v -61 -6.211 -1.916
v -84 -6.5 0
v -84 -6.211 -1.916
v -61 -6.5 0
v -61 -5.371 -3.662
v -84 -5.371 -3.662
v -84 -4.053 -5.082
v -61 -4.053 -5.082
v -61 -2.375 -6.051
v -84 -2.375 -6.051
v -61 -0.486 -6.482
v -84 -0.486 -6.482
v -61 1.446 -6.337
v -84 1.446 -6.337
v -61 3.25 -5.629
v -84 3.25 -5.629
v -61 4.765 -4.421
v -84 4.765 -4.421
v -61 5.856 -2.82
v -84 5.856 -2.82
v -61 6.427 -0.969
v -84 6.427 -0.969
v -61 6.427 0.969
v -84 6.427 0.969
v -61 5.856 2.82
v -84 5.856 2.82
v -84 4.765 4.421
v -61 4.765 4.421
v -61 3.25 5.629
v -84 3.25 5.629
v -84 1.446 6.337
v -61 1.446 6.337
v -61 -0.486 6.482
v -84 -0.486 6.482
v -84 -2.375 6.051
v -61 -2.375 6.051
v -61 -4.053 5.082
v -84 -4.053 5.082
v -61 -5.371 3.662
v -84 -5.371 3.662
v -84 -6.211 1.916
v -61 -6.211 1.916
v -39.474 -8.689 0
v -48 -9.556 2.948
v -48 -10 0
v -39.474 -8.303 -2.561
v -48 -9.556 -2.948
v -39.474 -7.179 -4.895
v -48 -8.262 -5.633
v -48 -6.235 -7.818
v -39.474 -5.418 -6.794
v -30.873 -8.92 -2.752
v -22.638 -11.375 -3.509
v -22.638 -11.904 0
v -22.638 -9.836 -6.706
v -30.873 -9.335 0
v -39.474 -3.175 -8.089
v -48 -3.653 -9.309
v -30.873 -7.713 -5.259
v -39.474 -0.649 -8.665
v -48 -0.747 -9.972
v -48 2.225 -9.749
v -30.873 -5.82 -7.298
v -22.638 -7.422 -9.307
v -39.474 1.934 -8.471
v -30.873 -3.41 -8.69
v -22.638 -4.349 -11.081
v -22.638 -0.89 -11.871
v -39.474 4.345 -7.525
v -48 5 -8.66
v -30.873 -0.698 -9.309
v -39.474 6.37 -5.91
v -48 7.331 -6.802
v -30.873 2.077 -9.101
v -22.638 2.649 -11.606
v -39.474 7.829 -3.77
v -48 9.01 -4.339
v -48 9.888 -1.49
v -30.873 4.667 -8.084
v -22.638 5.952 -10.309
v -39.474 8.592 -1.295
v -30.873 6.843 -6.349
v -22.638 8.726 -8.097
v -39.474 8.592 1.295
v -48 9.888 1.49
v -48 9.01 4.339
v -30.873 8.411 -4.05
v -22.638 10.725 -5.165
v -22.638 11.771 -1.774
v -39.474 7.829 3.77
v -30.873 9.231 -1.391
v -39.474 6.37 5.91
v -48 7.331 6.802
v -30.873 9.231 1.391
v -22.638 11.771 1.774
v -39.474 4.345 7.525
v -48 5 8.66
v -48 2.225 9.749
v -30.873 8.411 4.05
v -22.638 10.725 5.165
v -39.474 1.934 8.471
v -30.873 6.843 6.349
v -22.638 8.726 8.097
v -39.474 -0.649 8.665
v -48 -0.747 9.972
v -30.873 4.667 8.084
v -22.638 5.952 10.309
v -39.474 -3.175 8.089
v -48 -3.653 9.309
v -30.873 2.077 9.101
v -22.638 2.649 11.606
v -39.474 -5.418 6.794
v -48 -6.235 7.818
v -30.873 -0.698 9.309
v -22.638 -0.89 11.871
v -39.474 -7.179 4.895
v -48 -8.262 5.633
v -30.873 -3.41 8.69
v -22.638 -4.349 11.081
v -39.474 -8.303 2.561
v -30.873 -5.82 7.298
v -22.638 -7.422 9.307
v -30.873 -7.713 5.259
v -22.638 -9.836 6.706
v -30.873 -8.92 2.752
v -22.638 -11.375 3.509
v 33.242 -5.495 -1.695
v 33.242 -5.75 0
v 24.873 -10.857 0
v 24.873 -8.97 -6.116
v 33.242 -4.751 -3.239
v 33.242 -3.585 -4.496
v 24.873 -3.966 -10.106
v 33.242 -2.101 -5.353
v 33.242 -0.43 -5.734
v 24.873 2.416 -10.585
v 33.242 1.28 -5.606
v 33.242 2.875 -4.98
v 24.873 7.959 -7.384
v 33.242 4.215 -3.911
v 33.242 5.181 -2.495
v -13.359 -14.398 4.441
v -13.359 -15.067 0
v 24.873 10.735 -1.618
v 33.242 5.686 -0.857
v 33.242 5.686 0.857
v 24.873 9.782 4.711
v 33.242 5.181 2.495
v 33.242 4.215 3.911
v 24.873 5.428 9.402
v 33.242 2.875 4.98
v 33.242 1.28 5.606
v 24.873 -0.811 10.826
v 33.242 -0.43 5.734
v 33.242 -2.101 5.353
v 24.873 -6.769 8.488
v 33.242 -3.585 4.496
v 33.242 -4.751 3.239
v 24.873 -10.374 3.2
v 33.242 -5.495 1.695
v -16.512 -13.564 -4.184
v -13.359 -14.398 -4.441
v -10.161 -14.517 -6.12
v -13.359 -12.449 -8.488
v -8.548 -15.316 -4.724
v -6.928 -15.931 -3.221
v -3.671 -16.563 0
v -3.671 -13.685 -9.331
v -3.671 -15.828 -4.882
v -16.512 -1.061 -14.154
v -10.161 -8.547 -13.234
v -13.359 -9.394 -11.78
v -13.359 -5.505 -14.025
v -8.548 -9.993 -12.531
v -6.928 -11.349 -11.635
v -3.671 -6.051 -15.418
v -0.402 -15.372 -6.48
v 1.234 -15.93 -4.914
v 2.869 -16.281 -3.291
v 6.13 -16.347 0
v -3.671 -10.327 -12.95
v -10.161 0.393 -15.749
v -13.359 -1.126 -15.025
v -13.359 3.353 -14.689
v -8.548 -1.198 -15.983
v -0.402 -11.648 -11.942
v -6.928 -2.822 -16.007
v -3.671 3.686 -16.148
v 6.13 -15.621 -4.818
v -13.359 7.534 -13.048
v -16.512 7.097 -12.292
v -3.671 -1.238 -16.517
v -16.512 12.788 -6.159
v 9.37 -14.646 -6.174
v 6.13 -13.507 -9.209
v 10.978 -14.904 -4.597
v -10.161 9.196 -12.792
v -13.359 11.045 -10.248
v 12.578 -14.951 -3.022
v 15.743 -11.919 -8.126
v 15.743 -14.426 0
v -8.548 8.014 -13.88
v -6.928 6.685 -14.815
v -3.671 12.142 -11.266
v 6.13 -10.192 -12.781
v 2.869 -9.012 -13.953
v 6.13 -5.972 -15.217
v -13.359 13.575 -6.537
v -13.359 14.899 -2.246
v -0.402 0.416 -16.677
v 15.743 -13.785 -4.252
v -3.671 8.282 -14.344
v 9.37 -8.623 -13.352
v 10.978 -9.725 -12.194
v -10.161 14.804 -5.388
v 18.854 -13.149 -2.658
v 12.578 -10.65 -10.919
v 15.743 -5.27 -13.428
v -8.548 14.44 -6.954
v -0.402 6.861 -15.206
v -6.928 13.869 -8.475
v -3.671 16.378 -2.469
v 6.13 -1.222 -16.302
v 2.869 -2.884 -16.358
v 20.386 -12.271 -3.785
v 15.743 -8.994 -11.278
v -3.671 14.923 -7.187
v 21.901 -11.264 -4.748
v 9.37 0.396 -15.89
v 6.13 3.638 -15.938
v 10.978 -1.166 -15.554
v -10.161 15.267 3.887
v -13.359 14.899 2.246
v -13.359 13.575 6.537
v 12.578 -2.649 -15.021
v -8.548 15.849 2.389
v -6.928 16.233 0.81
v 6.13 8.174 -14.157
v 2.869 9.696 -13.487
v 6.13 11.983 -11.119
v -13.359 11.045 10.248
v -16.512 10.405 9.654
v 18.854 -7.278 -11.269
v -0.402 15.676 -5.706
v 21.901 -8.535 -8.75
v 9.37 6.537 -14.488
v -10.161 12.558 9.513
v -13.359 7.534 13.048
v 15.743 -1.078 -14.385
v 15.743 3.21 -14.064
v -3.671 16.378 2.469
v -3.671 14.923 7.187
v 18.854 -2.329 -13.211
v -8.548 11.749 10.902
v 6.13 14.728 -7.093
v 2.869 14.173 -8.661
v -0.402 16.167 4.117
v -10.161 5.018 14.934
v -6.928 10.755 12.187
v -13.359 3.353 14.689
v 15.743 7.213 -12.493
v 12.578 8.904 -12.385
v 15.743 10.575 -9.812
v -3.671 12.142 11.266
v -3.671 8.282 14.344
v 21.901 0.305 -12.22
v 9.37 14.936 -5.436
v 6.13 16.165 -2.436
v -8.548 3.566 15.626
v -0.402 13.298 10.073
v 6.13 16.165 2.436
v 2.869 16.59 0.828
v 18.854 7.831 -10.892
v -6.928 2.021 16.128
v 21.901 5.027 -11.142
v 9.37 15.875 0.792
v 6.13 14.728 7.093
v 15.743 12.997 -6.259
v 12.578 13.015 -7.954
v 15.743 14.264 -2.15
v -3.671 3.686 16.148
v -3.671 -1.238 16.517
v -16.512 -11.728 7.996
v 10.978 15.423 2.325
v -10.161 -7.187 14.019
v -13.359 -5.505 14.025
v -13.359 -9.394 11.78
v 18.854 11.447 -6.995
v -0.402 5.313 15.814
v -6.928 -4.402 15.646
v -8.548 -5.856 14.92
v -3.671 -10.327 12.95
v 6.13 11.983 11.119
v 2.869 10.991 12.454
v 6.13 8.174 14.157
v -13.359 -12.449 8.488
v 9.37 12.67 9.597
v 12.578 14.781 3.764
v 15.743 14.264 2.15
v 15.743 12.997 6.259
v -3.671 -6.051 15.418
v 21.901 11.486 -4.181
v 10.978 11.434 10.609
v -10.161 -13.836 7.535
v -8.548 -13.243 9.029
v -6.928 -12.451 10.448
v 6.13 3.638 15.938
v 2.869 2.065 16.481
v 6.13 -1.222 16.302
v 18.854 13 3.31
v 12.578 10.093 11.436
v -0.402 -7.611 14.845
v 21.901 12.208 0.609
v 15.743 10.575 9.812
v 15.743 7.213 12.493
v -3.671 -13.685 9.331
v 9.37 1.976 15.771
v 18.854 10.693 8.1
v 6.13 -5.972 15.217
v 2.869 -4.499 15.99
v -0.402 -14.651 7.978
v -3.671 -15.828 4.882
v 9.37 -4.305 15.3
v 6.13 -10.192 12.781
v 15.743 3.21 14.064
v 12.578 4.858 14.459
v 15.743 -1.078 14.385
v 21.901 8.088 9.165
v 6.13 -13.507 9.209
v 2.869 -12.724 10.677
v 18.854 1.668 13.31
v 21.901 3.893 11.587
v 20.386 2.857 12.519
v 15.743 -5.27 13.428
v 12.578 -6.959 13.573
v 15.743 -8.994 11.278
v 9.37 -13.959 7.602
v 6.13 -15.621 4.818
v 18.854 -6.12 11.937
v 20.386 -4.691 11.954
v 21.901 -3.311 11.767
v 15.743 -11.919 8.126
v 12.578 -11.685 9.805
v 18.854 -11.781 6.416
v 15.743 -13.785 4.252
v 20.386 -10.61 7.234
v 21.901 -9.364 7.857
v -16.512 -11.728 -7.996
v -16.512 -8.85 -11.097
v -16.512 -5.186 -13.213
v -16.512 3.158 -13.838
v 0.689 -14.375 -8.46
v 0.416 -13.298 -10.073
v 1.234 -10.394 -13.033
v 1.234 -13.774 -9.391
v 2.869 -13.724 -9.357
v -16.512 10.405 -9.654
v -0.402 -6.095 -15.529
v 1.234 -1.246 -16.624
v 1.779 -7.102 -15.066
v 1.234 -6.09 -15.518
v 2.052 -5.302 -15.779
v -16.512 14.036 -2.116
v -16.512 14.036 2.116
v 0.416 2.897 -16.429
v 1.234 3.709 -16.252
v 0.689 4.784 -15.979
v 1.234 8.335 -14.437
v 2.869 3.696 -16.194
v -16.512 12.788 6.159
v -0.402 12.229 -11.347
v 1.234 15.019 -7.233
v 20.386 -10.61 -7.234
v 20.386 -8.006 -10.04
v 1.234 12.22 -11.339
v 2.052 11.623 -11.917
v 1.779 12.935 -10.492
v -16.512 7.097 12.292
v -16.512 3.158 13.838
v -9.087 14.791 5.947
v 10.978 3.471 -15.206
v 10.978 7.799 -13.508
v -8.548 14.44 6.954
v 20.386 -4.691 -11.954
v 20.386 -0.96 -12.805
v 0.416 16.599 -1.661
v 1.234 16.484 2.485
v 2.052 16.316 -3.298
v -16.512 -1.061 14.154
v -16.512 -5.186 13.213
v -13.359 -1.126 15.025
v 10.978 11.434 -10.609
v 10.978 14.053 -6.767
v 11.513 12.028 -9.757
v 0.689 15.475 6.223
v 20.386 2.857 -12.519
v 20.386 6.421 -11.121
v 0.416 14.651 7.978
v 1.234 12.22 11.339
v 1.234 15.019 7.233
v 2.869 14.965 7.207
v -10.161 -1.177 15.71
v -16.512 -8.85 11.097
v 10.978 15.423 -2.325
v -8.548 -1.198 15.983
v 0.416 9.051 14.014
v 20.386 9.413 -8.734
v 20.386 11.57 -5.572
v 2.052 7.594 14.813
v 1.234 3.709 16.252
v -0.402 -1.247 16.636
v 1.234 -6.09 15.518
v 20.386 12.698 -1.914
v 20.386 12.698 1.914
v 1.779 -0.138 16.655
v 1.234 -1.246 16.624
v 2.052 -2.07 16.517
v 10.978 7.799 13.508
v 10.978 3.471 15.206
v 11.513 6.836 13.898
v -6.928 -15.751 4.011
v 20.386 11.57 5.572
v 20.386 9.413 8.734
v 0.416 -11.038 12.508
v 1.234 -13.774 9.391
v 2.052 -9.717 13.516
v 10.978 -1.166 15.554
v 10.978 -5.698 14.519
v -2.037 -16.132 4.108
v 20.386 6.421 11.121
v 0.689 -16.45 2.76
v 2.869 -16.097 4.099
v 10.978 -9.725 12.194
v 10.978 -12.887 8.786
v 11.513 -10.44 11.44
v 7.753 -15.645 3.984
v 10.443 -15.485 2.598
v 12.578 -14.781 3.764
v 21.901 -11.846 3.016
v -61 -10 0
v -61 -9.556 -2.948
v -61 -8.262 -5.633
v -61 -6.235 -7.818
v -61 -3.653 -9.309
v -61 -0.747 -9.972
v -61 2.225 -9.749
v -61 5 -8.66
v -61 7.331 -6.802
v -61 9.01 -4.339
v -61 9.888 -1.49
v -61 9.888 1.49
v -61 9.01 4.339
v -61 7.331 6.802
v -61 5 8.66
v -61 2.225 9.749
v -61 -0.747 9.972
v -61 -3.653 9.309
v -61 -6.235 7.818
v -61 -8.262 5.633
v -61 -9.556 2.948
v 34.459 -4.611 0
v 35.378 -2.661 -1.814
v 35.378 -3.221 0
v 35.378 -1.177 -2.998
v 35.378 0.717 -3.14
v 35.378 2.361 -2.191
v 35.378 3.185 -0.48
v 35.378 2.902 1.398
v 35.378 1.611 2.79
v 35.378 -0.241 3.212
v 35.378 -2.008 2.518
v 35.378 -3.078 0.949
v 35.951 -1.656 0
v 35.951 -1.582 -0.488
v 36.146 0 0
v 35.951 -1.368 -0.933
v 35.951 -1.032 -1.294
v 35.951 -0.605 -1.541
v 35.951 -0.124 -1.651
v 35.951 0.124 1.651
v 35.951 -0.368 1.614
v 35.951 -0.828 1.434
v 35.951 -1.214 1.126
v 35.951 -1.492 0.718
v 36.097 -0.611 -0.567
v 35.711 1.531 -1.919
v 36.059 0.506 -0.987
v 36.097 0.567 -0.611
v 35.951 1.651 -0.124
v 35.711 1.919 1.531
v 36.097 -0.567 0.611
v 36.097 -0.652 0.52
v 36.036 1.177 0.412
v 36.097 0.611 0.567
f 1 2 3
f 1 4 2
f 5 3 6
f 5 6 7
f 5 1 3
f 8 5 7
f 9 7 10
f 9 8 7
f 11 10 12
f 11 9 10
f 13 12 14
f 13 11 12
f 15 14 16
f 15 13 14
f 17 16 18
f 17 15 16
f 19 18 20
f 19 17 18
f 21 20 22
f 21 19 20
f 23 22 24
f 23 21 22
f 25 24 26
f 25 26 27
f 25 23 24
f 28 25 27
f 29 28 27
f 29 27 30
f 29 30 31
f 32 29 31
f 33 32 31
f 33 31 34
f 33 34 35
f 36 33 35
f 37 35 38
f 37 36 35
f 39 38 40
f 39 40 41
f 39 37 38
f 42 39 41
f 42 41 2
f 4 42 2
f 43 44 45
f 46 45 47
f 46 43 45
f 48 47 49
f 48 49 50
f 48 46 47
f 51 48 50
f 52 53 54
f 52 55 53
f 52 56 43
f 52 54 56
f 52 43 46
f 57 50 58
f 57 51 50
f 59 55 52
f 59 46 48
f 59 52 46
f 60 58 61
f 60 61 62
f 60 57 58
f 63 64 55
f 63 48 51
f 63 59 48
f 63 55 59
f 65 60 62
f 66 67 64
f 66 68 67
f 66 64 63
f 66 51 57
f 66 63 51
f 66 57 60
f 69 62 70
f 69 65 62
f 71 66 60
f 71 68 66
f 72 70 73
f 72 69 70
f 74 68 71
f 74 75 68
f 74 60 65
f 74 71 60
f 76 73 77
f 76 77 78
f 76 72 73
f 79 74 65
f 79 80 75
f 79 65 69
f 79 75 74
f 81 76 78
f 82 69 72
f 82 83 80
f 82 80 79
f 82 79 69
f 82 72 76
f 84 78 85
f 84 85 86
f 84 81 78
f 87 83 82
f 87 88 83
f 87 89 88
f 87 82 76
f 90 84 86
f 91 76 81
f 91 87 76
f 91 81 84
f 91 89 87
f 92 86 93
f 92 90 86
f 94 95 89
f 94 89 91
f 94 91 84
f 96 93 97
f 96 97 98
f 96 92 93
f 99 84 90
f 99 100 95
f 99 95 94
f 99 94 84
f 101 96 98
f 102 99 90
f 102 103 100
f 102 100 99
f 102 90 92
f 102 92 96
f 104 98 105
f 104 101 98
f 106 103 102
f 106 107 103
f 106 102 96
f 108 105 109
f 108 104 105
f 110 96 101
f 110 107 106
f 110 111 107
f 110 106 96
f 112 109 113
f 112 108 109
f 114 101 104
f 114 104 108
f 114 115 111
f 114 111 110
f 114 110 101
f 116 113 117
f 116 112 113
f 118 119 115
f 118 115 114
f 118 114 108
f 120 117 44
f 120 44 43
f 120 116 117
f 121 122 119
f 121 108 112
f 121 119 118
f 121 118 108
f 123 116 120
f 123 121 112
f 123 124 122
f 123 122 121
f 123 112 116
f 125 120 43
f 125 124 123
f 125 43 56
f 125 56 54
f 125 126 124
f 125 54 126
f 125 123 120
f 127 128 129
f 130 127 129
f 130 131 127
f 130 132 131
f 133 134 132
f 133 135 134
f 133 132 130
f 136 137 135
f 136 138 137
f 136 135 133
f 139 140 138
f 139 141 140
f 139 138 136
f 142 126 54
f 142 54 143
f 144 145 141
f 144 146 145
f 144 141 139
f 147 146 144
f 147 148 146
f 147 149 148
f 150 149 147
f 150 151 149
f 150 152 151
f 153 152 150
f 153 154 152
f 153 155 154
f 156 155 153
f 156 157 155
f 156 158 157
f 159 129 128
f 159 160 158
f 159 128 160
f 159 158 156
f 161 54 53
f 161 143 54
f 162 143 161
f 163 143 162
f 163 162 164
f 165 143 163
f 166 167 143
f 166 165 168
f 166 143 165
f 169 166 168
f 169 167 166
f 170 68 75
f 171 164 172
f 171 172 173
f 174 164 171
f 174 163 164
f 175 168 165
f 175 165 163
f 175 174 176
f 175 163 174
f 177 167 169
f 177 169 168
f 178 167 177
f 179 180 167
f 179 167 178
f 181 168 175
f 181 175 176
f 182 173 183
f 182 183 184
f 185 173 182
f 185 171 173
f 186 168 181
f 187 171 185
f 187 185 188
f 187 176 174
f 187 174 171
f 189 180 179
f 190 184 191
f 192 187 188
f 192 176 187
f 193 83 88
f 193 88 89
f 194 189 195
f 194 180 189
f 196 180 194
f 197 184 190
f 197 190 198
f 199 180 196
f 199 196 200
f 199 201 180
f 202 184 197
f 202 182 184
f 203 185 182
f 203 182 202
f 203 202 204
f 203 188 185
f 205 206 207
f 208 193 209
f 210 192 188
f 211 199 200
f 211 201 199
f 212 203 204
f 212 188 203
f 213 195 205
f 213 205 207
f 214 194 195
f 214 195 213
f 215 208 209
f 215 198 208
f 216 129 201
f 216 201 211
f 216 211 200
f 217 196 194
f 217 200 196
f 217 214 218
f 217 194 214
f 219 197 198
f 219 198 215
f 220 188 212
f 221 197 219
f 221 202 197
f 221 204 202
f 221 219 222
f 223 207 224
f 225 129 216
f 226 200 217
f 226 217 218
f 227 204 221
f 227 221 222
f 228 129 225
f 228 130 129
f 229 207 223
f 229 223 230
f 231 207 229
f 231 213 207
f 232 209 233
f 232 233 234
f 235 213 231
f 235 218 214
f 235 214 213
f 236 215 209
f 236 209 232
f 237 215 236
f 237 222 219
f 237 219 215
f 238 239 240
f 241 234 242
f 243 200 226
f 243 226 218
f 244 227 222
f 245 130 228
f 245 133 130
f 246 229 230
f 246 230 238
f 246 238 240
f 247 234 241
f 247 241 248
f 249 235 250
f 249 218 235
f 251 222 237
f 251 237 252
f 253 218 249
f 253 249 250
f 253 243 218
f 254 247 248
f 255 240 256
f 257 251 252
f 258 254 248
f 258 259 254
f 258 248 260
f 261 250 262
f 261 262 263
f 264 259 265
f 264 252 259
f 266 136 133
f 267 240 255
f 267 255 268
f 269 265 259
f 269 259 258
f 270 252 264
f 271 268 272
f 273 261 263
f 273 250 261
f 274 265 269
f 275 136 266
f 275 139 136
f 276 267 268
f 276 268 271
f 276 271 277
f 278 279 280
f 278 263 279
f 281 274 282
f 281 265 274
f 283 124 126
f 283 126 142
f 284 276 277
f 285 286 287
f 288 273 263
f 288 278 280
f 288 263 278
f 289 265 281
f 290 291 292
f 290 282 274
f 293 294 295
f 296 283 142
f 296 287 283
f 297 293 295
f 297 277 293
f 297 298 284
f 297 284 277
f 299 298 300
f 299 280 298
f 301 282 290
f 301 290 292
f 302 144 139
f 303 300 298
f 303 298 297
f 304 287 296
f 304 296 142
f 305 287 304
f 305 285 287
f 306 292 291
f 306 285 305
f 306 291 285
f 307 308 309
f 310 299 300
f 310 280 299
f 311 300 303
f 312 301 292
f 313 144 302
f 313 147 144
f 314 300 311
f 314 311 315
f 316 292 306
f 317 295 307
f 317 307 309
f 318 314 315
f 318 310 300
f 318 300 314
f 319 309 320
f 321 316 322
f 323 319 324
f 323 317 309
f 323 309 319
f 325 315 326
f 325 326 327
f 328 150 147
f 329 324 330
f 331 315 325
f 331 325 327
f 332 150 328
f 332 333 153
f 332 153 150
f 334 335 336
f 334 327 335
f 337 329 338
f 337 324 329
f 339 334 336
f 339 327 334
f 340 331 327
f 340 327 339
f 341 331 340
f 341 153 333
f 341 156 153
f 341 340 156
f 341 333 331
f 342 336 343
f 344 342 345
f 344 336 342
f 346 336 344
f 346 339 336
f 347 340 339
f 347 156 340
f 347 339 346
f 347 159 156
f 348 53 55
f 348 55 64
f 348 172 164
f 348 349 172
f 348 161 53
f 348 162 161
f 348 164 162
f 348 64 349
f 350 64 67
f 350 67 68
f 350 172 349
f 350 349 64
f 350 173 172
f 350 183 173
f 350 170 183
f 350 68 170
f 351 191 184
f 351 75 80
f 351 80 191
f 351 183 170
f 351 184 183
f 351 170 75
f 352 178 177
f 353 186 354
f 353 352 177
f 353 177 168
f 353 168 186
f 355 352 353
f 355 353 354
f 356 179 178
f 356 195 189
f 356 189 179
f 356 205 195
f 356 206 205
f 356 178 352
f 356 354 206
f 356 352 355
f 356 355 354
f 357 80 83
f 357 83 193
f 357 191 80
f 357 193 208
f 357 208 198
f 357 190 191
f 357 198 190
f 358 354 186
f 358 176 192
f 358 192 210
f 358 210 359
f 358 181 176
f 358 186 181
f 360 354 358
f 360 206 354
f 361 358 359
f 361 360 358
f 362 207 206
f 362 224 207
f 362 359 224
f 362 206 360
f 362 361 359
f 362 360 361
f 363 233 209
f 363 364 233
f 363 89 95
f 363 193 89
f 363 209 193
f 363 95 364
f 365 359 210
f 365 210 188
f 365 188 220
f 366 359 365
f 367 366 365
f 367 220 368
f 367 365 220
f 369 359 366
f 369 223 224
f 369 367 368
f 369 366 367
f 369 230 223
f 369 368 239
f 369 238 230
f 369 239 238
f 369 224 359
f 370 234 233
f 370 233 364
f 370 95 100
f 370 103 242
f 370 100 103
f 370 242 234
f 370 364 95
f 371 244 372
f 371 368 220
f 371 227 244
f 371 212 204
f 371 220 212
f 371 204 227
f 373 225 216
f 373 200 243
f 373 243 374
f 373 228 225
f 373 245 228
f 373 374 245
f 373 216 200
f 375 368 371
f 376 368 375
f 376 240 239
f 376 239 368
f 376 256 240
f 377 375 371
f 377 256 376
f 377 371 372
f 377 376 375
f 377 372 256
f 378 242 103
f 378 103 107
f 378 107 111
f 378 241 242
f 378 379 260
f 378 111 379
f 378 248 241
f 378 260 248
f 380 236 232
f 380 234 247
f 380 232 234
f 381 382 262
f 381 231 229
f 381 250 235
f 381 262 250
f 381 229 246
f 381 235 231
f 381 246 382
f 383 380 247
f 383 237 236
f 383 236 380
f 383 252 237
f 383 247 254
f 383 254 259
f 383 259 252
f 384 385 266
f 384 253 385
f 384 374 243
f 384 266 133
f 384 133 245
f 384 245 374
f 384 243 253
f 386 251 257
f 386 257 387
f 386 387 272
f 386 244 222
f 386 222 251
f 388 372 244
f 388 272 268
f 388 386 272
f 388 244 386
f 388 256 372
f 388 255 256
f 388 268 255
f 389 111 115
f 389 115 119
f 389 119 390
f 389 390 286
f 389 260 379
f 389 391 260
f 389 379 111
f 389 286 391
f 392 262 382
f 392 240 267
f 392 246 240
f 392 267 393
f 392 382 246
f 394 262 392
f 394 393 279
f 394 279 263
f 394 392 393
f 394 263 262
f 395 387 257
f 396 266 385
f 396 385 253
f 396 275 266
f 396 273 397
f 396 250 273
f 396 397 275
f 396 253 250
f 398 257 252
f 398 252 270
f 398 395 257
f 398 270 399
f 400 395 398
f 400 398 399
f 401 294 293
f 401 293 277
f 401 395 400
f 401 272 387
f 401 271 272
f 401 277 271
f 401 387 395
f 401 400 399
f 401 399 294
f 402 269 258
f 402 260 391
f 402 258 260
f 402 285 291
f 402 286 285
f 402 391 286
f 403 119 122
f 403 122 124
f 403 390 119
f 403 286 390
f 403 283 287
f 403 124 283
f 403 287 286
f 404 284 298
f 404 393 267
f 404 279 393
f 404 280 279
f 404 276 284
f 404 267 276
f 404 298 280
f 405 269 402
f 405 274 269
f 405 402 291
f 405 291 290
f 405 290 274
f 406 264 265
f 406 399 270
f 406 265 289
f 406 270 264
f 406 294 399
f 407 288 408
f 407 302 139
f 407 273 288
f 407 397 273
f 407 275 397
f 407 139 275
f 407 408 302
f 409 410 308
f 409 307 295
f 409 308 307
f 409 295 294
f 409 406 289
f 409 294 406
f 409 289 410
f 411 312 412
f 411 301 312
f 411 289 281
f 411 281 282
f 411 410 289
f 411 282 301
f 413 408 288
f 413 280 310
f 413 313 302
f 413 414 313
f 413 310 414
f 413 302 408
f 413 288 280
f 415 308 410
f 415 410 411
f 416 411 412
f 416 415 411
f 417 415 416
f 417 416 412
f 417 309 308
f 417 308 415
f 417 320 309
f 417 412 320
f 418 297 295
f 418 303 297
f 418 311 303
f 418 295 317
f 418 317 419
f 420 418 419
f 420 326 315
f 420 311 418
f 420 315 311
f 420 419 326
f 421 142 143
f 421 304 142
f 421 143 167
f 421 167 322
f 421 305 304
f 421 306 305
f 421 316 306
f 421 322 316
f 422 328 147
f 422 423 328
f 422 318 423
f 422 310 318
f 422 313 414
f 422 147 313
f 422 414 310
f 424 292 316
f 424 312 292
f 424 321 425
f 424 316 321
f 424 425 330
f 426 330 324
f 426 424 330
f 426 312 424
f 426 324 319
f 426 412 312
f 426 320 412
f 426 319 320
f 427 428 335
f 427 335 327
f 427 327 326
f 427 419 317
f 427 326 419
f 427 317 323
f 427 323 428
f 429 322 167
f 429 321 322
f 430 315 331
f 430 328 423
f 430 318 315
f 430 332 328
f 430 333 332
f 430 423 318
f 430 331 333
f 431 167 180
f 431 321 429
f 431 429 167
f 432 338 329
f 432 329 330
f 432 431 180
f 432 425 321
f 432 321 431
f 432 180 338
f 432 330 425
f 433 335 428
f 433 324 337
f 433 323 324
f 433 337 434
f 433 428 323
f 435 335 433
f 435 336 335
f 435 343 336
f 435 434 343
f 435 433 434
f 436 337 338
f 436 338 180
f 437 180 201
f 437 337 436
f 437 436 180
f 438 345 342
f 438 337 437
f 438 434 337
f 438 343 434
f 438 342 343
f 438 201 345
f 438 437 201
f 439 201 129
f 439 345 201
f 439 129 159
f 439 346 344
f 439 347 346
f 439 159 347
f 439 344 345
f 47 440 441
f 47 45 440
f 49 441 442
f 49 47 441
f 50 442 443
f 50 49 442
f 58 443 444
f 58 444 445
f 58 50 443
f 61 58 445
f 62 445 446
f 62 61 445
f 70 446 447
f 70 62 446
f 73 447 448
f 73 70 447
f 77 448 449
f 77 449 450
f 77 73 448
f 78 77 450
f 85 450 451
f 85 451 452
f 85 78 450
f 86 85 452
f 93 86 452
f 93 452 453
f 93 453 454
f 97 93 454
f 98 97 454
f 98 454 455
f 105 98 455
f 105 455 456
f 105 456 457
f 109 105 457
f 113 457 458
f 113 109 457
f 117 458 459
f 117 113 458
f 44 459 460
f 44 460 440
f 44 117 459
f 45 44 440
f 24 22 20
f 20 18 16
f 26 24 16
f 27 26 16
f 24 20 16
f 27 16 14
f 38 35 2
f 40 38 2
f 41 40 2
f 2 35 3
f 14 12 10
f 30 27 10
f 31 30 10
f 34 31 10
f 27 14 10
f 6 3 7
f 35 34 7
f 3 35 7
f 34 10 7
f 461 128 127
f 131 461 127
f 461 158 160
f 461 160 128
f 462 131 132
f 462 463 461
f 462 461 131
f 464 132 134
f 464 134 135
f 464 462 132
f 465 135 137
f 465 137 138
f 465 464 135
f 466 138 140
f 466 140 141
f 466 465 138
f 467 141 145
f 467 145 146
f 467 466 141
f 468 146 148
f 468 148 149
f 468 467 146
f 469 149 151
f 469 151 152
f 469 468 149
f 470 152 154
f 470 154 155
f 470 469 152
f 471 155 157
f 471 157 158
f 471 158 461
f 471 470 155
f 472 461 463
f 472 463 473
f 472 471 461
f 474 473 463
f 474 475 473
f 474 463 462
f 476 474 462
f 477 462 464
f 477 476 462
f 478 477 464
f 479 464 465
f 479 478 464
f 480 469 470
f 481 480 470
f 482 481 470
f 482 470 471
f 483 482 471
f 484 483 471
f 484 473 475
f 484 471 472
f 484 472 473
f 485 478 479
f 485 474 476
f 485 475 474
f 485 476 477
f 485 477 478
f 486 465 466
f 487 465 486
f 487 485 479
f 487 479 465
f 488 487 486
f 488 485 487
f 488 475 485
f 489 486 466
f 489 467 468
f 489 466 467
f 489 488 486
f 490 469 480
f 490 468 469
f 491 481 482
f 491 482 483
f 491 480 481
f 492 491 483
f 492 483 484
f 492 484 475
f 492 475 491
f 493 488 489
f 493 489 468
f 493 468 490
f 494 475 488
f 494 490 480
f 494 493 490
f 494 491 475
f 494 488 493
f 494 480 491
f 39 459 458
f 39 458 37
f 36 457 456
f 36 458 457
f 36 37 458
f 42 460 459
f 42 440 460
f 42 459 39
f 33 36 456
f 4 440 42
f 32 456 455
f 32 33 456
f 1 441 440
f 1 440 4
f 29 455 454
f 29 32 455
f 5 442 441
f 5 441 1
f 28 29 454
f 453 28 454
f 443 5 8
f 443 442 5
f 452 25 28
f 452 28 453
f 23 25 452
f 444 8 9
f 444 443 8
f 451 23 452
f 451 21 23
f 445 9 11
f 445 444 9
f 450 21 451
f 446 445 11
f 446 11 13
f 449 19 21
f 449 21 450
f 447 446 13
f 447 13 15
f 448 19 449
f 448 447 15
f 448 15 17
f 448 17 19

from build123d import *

# Parameters (mm, degrees)
F0_W = 23
F0_H = 6.5


with BuildPart() as f1:
    # F0 (on Top) → F1 (revolve)
    with BuildSketch(Plane.XY):
        with BuildLine():
            Line((-61, 0), (-61, -6.5))
            Line((-61, -6.5), (-61, -10))
            Line((-61, -10), (-48, -10))
            ThreePointArc((-48, -10), (-35.155125, -8.767246), (-22.638298, -11.904051))
            ThreePointArc((-22.638298, -11.904051), (6.129777, -16.34737), (33.24159, -5.750445))
            ThreePointArc((33.24159, -5.750445), (35.378368, -3.221045), (36.145537, 0))
            Line((36.145537, 0), (-61, 0))
        make_face()
    revolve(axis=Axis((-4.224361, 0, 0), (1, 0, 0)))

    # F0 (on Top) → F2 (revolve)
    with BuildSketch(Plane.XY):
        with Locations((-72.5, -3.25)):
            Rectangle(F0_W, F0_H)
    revolve(axis=Axis((-4.224361, 0, 0), (1, 0, 0)))


solid = f1.part
